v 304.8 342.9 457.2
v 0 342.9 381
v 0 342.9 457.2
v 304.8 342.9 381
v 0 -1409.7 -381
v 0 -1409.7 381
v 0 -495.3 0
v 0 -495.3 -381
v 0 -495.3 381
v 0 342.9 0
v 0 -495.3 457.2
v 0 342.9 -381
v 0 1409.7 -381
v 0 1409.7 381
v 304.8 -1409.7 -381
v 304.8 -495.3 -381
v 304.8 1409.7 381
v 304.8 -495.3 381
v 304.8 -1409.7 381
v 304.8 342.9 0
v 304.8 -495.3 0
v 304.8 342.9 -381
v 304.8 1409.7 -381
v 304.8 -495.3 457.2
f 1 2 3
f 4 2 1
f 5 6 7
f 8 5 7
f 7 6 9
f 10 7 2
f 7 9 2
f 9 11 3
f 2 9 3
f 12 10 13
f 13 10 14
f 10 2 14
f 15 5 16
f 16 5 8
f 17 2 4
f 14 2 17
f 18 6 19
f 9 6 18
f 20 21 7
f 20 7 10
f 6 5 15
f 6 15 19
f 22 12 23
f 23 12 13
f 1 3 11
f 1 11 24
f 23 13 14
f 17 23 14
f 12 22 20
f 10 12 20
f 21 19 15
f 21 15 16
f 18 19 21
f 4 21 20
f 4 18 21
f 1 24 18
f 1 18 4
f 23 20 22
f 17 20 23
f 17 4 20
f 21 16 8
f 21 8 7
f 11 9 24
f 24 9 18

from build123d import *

# Parameters (mm, degrees)
F0_W     = 2819.4
F0_H     = 762
F1_DEPTH = 304.8
F2_W     = 838.2
F2_H     = 381
F3_DEPTH = 304.8
F4_W     = 304.8
F4_H     = 838.2
F5_DEPTH = 76.2


with BuildPart() as f1:
    # F0 (on Right) → F1 (new body)
    with BuildSketch(Plane.YZ):
        Rectangle(F0_W, F0_H)
    extrude(amount=F1_DEPTH)

    # F2 (on face) → F3 (cut)
    with BuildSketch(Plane.YZ.offset(304.8)):
        with Locations((-76.2, -190.5)):
            Rectangle(F2_W, F2_H)
    extrude(amount=-F3_DEPTH, mode=Mode.SUBTRACT)

    # F4 (on face) → F5 (join)
    with BuildSketch(Plane.XY.offset(381)):
        with Locations((152.4, -76.2)):
            Rectangle(F4_W, F4_H)
    extrude(amount=F5_DEPTH)


solid = f1.part
